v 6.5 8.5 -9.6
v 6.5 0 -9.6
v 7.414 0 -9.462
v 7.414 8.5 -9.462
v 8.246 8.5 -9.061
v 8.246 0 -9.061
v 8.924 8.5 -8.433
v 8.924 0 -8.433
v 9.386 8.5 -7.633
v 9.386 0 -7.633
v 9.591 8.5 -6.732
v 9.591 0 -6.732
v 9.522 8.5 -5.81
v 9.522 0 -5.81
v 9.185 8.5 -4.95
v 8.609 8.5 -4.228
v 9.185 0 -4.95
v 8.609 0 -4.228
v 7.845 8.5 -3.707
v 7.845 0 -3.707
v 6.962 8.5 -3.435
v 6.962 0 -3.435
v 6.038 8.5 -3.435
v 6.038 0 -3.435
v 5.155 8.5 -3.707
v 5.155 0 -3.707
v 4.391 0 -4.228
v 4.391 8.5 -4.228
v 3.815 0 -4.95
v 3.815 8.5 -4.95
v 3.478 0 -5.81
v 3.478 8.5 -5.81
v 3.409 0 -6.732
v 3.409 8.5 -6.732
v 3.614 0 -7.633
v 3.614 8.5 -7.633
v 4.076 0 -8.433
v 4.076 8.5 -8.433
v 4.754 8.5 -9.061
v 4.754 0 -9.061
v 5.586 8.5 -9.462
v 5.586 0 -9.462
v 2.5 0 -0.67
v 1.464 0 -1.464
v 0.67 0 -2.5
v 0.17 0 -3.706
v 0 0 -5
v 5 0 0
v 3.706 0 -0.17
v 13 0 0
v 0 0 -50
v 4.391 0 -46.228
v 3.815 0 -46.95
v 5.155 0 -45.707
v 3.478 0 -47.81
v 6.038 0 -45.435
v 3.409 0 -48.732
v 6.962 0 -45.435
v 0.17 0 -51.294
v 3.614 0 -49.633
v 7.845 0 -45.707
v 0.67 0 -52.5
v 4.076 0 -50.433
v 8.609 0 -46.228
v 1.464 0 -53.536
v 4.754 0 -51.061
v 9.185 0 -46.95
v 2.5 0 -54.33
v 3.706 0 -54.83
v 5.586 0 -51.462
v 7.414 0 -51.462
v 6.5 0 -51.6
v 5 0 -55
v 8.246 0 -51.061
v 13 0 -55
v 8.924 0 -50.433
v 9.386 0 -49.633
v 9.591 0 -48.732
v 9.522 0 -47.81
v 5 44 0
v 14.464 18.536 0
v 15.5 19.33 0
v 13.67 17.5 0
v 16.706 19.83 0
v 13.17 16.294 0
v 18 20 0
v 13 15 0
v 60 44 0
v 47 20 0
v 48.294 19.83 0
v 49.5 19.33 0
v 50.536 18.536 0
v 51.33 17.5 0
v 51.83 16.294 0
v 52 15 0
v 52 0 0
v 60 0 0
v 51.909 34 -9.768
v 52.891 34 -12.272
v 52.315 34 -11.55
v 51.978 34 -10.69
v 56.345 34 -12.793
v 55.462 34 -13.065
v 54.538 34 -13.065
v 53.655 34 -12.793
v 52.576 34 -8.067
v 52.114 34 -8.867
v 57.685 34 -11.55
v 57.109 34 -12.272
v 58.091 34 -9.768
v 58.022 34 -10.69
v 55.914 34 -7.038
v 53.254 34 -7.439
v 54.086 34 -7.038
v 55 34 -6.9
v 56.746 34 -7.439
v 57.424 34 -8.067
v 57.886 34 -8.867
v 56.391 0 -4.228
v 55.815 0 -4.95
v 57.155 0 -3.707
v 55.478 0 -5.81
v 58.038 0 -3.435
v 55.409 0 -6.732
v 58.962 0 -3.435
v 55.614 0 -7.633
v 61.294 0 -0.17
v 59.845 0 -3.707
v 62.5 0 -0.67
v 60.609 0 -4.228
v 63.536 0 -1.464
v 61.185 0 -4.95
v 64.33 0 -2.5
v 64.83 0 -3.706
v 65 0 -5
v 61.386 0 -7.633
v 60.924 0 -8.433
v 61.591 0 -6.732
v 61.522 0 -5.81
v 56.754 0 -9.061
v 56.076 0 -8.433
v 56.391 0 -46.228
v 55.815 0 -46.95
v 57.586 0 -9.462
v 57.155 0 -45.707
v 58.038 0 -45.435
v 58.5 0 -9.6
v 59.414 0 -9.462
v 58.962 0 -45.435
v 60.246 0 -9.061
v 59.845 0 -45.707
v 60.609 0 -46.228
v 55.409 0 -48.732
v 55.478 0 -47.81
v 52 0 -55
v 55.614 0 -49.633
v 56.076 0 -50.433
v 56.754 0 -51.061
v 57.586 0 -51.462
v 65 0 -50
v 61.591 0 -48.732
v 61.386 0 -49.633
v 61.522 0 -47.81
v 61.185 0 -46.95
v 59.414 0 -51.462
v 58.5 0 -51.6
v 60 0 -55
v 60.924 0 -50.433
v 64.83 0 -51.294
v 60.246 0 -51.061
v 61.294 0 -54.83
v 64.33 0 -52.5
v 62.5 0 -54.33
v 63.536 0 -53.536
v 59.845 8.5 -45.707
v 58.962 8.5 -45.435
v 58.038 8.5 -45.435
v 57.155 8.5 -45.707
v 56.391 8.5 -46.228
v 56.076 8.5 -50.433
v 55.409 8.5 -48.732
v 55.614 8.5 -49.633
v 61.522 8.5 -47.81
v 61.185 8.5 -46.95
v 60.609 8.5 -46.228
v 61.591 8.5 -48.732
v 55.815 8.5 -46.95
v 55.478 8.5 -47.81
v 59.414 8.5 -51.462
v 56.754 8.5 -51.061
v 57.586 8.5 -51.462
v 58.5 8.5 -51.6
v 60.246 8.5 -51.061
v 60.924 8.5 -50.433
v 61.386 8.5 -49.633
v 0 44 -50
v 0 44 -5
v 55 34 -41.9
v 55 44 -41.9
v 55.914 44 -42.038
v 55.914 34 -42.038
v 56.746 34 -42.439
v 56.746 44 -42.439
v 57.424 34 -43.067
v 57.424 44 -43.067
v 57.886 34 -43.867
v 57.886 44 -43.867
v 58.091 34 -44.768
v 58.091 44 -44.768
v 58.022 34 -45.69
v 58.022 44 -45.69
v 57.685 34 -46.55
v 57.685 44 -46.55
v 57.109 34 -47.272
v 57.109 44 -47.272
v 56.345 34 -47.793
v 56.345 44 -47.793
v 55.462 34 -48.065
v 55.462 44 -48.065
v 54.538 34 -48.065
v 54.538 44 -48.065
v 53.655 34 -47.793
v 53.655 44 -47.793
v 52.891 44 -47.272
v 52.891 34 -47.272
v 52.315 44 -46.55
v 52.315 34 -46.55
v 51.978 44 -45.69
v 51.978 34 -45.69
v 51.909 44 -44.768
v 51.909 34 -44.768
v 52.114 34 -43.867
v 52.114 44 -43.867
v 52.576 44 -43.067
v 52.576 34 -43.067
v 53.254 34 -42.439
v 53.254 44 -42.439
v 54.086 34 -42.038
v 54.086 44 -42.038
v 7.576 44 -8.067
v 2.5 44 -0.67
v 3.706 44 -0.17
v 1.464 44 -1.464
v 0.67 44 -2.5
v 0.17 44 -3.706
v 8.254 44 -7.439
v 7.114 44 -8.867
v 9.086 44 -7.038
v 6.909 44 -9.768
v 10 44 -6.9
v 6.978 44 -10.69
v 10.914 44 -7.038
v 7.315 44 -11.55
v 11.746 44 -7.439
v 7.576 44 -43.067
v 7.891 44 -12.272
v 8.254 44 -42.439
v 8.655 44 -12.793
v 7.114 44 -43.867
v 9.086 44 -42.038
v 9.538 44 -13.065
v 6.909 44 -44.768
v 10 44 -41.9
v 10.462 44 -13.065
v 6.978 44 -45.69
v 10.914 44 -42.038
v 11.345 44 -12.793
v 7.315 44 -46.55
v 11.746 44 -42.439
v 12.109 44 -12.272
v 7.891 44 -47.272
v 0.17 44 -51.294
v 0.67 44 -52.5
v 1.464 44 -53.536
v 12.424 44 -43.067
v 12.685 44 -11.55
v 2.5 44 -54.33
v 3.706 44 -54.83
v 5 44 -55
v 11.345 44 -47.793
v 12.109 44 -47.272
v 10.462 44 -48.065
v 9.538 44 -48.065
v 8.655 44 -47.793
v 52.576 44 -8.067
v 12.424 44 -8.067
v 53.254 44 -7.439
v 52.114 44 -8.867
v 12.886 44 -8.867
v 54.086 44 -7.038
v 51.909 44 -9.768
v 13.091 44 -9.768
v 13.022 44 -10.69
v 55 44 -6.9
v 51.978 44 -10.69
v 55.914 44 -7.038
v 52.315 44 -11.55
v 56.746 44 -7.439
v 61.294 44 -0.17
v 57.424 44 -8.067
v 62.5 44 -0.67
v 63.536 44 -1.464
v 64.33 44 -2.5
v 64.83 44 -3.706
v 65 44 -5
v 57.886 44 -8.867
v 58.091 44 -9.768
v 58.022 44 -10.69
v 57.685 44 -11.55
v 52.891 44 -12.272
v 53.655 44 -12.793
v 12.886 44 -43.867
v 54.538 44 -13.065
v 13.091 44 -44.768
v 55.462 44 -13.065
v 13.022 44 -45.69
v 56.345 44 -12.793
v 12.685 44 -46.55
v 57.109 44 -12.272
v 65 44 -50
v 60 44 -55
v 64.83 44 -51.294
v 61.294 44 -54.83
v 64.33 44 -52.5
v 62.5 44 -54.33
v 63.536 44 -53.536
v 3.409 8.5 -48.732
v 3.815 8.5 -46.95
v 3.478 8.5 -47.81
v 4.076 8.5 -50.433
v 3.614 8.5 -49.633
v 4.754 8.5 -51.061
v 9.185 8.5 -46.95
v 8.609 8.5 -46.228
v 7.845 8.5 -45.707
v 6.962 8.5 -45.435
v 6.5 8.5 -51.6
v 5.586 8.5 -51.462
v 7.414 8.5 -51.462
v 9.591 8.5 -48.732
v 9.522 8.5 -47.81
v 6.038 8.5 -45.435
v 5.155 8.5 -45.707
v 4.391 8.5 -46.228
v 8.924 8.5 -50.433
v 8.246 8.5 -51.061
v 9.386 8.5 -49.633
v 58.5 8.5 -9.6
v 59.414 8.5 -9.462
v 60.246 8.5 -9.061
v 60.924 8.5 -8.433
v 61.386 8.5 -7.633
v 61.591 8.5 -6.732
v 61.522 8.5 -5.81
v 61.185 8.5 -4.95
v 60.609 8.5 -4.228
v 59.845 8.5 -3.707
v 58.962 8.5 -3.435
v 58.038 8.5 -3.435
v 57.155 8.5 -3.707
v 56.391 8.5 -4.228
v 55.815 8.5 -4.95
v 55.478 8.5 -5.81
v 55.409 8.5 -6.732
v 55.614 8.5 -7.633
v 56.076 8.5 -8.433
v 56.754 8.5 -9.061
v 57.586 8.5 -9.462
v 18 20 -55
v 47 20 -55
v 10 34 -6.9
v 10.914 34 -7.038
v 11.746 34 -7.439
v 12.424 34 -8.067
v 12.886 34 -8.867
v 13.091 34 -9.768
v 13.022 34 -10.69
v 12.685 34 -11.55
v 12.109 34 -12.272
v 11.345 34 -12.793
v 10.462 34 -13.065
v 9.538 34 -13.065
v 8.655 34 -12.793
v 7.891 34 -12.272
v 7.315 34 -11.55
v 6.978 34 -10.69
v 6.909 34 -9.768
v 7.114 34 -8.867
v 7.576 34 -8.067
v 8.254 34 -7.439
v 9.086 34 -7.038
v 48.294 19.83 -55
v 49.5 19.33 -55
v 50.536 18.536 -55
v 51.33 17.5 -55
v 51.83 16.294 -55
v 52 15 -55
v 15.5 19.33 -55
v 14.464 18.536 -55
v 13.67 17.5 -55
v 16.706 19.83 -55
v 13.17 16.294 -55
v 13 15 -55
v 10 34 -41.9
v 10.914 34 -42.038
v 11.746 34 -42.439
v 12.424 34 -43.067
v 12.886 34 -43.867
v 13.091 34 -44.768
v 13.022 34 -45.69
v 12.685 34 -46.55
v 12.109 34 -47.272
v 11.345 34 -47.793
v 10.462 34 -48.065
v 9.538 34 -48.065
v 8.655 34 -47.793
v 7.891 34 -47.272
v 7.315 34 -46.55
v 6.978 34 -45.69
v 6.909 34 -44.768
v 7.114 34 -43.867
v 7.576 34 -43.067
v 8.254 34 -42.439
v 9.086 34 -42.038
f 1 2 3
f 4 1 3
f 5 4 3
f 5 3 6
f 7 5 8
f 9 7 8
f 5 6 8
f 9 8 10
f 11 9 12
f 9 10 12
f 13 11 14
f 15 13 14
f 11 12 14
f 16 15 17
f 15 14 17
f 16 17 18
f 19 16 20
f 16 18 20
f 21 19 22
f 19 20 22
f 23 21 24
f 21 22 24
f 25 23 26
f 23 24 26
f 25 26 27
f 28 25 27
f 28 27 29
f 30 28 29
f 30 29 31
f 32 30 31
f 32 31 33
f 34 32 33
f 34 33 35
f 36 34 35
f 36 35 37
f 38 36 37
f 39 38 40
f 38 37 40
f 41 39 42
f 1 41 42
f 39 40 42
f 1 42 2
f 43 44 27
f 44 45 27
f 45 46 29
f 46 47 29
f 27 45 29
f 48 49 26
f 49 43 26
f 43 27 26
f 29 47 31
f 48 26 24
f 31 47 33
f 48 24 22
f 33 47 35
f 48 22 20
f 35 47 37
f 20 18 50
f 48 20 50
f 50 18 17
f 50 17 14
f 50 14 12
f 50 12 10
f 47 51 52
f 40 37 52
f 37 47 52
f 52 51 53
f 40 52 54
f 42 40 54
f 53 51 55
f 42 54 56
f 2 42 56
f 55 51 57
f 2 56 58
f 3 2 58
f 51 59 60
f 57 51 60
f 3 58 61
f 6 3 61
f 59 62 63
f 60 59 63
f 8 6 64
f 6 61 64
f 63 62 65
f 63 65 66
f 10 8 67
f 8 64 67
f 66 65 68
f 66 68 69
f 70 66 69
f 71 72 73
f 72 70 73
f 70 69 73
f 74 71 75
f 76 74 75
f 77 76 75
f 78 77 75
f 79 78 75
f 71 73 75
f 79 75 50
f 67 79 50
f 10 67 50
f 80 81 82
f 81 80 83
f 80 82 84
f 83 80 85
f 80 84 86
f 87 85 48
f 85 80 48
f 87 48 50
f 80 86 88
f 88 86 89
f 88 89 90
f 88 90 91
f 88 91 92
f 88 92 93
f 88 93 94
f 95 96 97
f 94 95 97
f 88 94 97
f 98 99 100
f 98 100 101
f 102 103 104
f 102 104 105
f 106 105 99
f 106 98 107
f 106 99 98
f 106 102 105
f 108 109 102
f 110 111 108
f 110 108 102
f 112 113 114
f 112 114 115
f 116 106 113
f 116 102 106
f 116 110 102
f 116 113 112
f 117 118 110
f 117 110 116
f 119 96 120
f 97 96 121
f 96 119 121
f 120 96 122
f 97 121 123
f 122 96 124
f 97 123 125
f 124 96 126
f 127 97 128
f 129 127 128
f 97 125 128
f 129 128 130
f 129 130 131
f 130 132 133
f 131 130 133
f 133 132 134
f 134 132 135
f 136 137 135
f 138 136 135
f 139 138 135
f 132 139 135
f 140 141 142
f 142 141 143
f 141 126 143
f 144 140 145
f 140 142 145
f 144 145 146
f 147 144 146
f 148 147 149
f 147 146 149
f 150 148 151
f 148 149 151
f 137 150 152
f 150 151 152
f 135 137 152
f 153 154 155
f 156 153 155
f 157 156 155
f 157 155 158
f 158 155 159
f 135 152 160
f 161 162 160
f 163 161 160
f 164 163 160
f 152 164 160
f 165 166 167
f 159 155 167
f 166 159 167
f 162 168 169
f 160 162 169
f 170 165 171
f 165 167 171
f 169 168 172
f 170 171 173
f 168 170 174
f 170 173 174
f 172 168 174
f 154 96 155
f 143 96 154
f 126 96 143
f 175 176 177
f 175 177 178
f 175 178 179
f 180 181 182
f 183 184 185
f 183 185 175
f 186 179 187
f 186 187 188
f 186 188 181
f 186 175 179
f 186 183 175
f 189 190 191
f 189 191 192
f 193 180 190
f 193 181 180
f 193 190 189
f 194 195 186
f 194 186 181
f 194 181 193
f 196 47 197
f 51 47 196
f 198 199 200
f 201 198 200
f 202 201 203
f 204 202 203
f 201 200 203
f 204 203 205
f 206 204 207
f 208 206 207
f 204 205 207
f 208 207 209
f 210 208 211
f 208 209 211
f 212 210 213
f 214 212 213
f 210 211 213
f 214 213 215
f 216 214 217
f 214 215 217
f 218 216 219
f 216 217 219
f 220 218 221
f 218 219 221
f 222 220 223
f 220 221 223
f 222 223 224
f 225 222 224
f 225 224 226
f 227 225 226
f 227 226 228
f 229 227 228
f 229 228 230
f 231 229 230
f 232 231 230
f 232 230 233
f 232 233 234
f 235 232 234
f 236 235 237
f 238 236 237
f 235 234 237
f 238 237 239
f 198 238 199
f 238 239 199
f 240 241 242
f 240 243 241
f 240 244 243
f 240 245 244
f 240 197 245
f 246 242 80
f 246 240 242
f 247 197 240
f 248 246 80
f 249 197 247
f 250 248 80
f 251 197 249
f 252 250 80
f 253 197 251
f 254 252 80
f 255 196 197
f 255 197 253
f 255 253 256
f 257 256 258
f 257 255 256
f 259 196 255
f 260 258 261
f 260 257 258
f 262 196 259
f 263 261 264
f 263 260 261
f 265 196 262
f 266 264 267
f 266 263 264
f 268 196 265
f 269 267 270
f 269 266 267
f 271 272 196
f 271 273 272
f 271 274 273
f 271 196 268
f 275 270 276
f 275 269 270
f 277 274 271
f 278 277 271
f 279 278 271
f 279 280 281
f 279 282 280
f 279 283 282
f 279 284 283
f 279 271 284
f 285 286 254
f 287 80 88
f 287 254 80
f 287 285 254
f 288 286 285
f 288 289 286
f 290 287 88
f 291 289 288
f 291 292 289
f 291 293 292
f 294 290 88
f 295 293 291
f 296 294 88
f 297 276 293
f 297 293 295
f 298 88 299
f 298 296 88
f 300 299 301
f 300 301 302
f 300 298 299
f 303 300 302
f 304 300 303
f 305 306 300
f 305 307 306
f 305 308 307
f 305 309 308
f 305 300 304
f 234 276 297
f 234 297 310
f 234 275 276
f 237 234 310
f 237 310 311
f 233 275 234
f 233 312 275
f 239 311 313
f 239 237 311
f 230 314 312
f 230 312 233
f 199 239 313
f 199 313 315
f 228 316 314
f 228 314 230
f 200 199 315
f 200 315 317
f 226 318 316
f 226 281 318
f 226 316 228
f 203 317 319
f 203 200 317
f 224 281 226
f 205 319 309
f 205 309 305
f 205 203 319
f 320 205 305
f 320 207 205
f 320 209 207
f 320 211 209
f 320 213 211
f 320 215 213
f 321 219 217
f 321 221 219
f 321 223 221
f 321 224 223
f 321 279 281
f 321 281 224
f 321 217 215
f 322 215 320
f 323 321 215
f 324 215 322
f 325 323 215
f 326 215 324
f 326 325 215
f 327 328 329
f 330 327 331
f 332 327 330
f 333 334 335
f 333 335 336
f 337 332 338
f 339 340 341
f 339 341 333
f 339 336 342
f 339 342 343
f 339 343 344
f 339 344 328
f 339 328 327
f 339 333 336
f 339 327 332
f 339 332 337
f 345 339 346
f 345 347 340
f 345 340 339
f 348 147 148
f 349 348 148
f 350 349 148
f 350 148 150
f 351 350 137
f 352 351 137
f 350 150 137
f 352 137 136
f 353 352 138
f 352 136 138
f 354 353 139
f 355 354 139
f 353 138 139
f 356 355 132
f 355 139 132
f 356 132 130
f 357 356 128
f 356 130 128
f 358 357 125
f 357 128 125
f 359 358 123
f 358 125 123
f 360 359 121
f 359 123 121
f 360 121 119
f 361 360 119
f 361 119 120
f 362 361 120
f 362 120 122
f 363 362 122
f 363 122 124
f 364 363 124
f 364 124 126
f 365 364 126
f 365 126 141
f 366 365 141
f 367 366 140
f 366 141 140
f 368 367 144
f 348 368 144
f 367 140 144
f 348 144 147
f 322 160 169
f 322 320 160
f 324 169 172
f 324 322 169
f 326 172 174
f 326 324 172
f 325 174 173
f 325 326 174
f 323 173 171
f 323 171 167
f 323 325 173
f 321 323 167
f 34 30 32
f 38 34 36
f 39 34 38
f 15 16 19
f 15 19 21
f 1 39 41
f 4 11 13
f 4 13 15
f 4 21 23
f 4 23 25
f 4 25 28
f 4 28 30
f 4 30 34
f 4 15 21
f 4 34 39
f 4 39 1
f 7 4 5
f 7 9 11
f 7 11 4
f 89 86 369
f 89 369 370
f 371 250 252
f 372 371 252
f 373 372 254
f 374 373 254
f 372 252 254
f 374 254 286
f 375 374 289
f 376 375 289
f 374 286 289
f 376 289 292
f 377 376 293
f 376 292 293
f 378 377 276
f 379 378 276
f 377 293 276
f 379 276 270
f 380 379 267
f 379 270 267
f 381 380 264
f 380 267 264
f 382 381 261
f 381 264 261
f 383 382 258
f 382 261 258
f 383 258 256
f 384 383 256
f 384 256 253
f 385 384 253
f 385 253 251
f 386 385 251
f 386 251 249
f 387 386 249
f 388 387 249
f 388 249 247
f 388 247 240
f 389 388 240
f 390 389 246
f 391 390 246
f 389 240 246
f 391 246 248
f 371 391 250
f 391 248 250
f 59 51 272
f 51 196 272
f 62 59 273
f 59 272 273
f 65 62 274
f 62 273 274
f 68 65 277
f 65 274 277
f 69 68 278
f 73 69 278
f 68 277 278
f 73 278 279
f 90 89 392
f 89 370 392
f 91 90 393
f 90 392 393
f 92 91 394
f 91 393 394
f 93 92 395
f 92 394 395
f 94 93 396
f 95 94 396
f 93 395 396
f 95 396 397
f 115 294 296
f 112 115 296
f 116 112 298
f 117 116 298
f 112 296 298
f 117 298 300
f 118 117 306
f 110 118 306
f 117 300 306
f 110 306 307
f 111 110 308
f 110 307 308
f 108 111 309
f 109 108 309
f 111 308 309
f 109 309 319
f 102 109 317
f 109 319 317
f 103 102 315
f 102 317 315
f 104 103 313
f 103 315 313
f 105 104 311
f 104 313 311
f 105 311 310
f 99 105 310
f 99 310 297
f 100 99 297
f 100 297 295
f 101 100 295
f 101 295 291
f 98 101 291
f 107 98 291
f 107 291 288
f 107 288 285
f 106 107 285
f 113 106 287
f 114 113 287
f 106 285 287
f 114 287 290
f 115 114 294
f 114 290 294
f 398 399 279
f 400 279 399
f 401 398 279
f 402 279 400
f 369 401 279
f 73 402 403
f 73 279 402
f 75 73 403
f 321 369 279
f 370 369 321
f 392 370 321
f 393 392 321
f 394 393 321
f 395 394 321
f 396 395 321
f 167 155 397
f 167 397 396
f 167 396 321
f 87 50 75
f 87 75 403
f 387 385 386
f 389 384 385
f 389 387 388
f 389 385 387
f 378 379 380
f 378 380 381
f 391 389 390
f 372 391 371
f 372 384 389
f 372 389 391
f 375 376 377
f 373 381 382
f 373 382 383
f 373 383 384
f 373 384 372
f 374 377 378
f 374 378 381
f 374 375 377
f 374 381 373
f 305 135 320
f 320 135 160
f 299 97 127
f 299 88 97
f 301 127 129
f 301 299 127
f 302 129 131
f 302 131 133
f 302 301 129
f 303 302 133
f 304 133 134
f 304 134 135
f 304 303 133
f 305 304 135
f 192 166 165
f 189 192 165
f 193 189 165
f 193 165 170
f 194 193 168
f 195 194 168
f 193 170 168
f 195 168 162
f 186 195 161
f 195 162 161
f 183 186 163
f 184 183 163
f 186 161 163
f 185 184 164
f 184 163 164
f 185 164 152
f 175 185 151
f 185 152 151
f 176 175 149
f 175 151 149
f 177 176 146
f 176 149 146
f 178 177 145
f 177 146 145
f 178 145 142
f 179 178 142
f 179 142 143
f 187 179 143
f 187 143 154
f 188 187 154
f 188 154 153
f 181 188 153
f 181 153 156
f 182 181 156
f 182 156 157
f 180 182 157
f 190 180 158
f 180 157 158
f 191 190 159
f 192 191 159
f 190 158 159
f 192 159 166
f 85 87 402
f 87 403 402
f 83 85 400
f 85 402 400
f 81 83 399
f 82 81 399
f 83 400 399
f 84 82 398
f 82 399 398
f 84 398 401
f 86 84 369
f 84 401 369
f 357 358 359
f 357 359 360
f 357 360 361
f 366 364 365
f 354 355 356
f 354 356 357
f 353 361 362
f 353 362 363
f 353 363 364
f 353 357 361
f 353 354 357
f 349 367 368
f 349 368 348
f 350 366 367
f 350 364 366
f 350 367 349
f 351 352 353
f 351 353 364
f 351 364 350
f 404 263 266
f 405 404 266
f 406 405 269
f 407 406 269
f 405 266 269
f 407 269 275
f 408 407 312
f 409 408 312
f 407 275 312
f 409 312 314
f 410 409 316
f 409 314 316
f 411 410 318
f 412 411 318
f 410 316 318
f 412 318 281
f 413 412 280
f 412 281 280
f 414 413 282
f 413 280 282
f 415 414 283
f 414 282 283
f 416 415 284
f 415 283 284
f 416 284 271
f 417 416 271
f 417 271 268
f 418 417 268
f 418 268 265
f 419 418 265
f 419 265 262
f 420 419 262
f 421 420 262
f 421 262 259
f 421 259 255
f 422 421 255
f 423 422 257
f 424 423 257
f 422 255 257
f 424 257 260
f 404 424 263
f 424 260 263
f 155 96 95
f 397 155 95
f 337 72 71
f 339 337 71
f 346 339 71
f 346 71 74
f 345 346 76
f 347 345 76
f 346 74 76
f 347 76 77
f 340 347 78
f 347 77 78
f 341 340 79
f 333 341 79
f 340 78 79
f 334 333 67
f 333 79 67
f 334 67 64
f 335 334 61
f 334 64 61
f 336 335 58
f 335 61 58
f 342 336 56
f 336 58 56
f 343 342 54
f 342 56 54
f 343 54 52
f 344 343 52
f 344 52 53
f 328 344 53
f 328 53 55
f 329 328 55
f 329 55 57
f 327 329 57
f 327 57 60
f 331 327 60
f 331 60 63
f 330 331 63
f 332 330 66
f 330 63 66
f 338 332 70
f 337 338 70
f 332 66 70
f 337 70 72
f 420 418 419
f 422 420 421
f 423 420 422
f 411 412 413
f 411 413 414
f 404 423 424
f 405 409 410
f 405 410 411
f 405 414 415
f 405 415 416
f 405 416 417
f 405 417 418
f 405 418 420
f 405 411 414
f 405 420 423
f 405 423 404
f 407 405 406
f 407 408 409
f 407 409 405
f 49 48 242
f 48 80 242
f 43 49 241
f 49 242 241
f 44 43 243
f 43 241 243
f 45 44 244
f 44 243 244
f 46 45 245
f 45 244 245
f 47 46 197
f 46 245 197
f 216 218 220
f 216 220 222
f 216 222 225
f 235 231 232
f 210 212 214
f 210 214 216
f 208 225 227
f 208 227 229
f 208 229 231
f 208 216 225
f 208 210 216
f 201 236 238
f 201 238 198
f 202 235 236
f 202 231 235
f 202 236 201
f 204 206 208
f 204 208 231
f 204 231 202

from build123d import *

# Parameters (mm, degrees)
SKETCH1_W           = 65
SKETCH1_H           = 55
BOSS_EXTRUDE1_DEPTH = 44
SKETCH2_W           = 39
SKETCH2_H           = 20
CUT_EXTRUDE1_DEPTH  = 96.843622636
FILLET1_R           = 5
SKETCH3_R           = 3.1
CUT_EXTRUDE2_DEPTH  = 8.5
SKETCH4_R           = 3.1
CUT_EXTRUDE3_DEPTH  = 10
FILLET2_R           = 5


with BuildPart() as part:
    # Sketch1 → Boss-Extrude1 (new body)
    with BuildSketch(Plane(origin=(0, 0, 0), x_dir=(1, 0, 0), z_dir=(0, 1, 0))):
        with Locations((32.5, 27.5)):
            Rectangle(SKETCH1_W, SKETCH1_H)
    extrude(amount=BOSS_EXTRUDE1_DEPTH)

    # Sketch2 → Cut-Extrude1 (cut, through all)
    with BuildSketch(Plane.XY):
        with Locations((32.5, 10)):
            Rectangle(SKETCH2_W, SKETCH2_H)
    extrude(amount=-CUT_EXTRUDE1_DEPTH, mode=Mode.SUBTRACT)

    # Fillet1
    fillet1_edges = [part.edges().sort_by_distance(p)[0] for p in [
        (52, 20, -27.5),
        (13, 20, -27.5),
    ]]
    fillet(fillet1_edges, radius=FILLET1_R)

    # Sketch3 → Cut-Extrude2 (cut)
    with BuildSketch(Plane.XZ):
        with Locations(Location((58.5, -6.5, 0), (0, 0, 270))):
            Circle(SKETCH3_R)
        with Locations(Location((58.5, -48.5, 0), (0, 0, 270))):
            Circle(SKETCH3_R)
        with Locations(Location((6.5, -48.5, 0), (0, 0, 270))):
            Circle(SKETCH3_R)
        with Locations(Location((6.5, -6.5, 0), (0, 0, 270))):
            Circle(SKETCH3_R)
    extrude(amount=-CUT_EXTRUDE2_DEPTH, mode=Mode.SUBTRACT)

    # Sketch4 → Cut-Extrude3 (cut)
    with BuildSketch(Plane(origin=(0, 44, 0), x_dir=(1, 0, 0), z_dir=(0, 1, 0))):
        with Locations(Location((10, 45, 0), (0, 0, 270))):
            Circle(SKETCH4_R)
        with Locations(Location((55, 45, 0), (0, 0, 270))):
            Circle(SKETCH4_R)
        with Locations(Location((55, 10, 0), (0, 0, 270))):
            Circle(SKETCH4_R)
        with Locations(Location((10, 10, 0), (0, 0, 270))):
            Circle(SKETCH4_R)
    extrude(amount=-CUT_EXTRUDE3_DEPTH, mode=Mode.SUBTRACT)

    # Fillet2
    fillet2_edges = [part.edges().sort_by_distance(p)[0] for p in [
        (0, 22, -55),
        (65, 22, -55),
        (65, 22, 0),
        (0, 22, 0),
    ]]
    fillet(fillet2_edges, radius=FILLET2_R)


solid = part.part
